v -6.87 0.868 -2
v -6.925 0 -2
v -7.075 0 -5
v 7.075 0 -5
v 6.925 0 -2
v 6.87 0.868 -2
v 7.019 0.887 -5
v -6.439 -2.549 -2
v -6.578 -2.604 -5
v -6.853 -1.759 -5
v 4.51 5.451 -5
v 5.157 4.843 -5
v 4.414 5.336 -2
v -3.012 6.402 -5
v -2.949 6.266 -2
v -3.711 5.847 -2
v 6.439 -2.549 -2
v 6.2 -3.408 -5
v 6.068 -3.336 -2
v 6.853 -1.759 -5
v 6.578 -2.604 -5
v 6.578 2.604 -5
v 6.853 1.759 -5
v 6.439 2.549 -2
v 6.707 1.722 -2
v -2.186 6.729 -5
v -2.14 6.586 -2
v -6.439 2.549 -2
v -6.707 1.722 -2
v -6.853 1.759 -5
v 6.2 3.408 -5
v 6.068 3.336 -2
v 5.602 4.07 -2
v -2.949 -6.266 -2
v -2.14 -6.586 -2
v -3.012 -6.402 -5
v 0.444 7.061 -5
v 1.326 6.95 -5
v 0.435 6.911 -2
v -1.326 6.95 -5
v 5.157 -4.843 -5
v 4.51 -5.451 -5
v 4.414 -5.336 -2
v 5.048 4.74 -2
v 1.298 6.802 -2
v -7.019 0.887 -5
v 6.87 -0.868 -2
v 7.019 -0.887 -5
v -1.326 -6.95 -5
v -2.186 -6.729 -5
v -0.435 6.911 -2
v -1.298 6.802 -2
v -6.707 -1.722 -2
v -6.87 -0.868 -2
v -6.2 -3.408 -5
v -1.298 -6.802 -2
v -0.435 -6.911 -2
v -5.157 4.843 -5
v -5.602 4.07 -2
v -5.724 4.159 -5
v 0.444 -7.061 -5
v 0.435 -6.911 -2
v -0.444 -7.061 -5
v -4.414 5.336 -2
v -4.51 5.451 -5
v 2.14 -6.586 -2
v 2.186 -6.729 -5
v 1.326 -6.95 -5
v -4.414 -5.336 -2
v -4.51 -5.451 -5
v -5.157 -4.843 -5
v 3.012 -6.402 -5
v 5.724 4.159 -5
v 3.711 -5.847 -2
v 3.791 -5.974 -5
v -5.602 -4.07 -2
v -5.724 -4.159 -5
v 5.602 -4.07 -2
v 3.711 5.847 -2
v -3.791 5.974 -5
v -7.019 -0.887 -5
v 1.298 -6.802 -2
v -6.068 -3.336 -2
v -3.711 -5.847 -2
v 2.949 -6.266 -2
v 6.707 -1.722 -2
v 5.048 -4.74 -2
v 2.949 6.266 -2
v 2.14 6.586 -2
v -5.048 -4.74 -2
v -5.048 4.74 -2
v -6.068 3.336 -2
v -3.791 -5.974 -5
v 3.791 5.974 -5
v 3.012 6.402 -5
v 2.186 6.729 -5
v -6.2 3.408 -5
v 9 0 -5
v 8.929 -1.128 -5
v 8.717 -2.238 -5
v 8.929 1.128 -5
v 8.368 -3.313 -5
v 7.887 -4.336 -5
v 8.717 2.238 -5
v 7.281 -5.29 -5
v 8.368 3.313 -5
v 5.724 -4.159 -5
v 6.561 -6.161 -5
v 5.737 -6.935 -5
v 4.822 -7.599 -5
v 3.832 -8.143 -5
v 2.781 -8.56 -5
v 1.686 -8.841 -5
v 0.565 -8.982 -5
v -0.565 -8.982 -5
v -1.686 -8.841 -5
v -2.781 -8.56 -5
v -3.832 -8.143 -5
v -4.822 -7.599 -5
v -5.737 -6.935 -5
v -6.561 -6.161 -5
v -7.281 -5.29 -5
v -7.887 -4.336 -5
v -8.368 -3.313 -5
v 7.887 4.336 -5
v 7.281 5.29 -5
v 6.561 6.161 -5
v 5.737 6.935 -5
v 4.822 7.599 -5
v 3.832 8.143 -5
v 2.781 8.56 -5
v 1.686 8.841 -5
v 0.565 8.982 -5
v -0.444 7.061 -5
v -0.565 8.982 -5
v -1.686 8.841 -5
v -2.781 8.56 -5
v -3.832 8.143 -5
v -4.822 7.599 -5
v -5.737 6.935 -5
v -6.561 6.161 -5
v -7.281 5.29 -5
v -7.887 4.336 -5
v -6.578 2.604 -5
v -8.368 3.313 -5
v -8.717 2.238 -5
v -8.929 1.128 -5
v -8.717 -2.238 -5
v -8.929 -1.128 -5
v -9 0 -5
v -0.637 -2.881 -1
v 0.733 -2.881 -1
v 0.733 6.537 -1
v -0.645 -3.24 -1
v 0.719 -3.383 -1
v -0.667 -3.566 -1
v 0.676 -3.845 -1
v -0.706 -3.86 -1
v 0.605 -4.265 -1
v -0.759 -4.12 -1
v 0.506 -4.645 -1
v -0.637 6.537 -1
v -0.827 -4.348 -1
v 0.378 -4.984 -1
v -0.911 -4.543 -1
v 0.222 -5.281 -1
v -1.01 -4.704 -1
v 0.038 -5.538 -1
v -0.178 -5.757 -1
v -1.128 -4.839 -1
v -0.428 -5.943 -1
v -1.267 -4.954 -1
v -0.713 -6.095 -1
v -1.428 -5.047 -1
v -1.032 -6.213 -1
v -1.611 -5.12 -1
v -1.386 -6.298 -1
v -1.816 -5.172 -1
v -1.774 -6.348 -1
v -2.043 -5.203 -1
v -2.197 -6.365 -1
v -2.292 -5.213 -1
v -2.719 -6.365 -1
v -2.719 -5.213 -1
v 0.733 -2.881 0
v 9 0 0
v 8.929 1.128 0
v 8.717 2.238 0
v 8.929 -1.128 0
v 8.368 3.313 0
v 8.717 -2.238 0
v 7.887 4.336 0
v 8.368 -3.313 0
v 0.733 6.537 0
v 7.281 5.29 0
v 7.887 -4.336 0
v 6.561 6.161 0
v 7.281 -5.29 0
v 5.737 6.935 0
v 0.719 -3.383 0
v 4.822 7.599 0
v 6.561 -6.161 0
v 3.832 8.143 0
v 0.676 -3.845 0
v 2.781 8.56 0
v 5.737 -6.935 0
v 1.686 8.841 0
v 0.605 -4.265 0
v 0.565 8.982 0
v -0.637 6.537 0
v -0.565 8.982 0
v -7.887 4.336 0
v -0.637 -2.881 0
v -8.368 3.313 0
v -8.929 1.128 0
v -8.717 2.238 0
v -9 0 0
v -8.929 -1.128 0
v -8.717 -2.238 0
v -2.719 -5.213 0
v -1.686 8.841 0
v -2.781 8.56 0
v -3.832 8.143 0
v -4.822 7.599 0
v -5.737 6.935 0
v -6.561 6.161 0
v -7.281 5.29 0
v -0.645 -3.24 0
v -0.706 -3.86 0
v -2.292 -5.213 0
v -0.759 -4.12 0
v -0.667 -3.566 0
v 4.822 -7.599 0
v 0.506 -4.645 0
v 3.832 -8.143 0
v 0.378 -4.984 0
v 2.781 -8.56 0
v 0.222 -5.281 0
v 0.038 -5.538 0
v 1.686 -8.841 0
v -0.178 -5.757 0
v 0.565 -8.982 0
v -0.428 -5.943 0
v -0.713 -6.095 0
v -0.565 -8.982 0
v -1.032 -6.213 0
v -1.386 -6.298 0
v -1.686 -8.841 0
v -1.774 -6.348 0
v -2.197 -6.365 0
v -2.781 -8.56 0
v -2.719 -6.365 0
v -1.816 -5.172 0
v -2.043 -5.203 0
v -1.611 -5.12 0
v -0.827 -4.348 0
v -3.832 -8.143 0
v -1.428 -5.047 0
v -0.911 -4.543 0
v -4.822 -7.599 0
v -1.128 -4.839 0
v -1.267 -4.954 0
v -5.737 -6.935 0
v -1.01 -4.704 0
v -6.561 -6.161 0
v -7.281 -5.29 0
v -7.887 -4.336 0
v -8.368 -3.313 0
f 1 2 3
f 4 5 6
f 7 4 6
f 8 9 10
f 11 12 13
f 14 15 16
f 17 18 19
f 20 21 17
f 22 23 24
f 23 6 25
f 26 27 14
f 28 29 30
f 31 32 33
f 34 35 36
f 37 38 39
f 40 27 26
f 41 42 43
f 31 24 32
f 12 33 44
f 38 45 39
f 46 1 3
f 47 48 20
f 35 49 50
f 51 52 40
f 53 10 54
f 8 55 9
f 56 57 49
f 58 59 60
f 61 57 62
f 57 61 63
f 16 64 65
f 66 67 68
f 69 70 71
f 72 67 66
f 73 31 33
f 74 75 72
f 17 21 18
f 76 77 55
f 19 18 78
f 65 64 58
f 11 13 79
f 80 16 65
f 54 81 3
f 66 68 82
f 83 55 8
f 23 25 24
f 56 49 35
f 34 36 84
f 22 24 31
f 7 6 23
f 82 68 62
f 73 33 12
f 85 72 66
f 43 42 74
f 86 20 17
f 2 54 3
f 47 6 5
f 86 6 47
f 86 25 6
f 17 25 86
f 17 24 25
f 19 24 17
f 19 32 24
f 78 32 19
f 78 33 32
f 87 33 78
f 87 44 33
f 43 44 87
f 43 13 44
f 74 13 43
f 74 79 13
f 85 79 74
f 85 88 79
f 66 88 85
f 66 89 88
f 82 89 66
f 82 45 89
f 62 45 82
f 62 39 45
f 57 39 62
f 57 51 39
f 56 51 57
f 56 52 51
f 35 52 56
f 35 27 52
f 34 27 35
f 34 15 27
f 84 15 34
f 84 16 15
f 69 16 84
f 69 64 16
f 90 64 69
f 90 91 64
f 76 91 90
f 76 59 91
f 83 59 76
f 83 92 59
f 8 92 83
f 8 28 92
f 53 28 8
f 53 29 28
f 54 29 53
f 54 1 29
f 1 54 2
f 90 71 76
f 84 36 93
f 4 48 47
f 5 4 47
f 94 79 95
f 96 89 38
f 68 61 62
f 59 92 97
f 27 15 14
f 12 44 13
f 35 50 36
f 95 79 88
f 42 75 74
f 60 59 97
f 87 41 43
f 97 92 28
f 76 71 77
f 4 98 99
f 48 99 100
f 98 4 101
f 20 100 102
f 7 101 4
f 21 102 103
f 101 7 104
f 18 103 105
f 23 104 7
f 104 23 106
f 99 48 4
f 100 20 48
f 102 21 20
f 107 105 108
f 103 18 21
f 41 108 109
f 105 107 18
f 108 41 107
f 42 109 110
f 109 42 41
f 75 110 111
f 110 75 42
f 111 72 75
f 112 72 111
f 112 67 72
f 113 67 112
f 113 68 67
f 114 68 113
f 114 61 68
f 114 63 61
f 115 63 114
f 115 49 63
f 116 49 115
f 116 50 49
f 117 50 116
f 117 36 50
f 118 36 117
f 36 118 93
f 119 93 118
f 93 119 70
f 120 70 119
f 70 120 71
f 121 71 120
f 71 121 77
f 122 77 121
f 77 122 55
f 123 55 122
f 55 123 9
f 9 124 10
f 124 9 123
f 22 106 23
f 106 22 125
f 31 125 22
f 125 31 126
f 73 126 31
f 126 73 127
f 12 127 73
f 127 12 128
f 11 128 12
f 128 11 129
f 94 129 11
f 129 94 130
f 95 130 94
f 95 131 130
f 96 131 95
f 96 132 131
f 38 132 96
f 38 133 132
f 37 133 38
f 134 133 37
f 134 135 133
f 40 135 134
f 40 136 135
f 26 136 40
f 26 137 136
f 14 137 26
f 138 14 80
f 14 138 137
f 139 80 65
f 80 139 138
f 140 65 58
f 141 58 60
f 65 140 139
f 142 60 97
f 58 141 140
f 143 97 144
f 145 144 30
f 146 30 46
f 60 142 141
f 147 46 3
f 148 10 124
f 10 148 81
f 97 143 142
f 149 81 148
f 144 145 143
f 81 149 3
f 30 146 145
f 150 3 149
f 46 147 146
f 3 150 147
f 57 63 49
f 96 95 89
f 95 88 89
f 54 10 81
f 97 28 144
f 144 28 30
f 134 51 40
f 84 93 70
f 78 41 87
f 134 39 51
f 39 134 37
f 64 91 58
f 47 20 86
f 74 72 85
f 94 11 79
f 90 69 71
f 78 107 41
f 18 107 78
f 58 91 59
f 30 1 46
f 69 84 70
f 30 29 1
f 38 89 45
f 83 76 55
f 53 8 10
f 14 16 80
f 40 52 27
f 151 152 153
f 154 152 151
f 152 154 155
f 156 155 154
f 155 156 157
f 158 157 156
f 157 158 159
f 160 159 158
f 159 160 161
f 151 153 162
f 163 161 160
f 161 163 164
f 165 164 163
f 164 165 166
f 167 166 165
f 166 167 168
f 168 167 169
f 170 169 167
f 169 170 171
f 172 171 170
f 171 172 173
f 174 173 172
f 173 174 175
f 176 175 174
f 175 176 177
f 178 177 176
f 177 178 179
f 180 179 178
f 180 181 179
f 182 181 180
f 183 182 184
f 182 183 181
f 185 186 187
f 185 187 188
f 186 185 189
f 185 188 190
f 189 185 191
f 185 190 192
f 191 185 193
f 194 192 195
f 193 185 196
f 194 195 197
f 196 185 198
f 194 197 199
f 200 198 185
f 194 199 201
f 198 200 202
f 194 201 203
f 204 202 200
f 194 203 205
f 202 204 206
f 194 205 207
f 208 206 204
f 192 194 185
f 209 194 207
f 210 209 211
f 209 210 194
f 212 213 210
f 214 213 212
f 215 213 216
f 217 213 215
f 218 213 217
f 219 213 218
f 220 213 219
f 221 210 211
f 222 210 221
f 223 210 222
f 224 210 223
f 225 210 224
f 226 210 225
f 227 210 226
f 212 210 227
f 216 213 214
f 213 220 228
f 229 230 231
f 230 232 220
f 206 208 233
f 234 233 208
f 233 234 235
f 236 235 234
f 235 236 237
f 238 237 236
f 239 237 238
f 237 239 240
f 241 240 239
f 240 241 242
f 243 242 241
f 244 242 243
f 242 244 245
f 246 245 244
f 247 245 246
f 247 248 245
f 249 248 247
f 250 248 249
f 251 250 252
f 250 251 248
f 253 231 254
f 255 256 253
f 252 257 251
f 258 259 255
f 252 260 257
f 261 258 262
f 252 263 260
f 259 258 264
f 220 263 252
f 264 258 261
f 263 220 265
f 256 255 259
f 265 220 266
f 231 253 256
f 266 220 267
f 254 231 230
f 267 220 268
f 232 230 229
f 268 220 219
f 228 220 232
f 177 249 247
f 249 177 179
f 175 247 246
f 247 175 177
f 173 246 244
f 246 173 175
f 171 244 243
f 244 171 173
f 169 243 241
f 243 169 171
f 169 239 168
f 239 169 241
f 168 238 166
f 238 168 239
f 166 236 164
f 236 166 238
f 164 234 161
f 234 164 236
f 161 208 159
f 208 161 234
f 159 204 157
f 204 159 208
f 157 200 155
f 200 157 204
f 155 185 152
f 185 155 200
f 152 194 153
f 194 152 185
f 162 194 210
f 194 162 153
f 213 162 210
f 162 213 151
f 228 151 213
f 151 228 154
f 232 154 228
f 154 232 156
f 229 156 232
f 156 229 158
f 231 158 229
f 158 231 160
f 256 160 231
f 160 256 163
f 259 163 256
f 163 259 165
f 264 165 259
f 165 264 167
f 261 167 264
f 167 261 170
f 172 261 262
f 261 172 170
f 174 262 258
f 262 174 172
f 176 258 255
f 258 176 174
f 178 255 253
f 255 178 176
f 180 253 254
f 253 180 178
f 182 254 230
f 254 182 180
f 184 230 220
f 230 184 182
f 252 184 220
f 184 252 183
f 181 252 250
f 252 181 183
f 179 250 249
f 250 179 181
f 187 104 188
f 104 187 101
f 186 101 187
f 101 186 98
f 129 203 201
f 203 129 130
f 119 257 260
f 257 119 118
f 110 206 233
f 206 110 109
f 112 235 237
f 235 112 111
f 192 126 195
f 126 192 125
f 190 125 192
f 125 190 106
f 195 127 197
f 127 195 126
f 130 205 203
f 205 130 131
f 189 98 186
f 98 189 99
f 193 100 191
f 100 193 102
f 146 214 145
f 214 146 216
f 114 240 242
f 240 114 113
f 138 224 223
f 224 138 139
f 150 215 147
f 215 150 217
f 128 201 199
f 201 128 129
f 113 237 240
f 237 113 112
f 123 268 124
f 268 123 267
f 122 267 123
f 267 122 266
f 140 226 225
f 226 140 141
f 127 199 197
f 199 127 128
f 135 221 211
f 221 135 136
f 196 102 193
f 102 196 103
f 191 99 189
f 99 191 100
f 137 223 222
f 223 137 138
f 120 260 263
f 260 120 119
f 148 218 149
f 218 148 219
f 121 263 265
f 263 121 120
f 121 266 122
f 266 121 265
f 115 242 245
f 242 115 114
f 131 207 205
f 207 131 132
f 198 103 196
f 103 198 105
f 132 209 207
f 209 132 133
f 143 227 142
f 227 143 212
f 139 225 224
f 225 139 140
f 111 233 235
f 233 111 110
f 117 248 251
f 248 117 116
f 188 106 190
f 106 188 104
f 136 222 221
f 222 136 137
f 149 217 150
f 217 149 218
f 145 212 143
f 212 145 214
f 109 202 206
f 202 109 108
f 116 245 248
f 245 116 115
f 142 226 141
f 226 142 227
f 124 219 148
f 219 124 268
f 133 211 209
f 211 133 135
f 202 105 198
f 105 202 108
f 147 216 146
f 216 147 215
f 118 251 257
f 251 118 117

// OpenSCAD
$fn = 50;

difference() {
	union() {
		translate(v = [0, 0, -5.0]) {
			cylinder(h = 5, r = 9.0);
		}
	}
	union() {
		#translate(v = [0, 0, -5.0]) {
			cylinder(h = 3, r1 = 7.075, r2 = 6.925);
		}
		translate(v = [0, 0, -1]) {
			linear_extrude(height = 1) {
				text(font = "Impact", halign = "center", size = 10, text = "J", valign = "center");
			}
		}
	}
}
